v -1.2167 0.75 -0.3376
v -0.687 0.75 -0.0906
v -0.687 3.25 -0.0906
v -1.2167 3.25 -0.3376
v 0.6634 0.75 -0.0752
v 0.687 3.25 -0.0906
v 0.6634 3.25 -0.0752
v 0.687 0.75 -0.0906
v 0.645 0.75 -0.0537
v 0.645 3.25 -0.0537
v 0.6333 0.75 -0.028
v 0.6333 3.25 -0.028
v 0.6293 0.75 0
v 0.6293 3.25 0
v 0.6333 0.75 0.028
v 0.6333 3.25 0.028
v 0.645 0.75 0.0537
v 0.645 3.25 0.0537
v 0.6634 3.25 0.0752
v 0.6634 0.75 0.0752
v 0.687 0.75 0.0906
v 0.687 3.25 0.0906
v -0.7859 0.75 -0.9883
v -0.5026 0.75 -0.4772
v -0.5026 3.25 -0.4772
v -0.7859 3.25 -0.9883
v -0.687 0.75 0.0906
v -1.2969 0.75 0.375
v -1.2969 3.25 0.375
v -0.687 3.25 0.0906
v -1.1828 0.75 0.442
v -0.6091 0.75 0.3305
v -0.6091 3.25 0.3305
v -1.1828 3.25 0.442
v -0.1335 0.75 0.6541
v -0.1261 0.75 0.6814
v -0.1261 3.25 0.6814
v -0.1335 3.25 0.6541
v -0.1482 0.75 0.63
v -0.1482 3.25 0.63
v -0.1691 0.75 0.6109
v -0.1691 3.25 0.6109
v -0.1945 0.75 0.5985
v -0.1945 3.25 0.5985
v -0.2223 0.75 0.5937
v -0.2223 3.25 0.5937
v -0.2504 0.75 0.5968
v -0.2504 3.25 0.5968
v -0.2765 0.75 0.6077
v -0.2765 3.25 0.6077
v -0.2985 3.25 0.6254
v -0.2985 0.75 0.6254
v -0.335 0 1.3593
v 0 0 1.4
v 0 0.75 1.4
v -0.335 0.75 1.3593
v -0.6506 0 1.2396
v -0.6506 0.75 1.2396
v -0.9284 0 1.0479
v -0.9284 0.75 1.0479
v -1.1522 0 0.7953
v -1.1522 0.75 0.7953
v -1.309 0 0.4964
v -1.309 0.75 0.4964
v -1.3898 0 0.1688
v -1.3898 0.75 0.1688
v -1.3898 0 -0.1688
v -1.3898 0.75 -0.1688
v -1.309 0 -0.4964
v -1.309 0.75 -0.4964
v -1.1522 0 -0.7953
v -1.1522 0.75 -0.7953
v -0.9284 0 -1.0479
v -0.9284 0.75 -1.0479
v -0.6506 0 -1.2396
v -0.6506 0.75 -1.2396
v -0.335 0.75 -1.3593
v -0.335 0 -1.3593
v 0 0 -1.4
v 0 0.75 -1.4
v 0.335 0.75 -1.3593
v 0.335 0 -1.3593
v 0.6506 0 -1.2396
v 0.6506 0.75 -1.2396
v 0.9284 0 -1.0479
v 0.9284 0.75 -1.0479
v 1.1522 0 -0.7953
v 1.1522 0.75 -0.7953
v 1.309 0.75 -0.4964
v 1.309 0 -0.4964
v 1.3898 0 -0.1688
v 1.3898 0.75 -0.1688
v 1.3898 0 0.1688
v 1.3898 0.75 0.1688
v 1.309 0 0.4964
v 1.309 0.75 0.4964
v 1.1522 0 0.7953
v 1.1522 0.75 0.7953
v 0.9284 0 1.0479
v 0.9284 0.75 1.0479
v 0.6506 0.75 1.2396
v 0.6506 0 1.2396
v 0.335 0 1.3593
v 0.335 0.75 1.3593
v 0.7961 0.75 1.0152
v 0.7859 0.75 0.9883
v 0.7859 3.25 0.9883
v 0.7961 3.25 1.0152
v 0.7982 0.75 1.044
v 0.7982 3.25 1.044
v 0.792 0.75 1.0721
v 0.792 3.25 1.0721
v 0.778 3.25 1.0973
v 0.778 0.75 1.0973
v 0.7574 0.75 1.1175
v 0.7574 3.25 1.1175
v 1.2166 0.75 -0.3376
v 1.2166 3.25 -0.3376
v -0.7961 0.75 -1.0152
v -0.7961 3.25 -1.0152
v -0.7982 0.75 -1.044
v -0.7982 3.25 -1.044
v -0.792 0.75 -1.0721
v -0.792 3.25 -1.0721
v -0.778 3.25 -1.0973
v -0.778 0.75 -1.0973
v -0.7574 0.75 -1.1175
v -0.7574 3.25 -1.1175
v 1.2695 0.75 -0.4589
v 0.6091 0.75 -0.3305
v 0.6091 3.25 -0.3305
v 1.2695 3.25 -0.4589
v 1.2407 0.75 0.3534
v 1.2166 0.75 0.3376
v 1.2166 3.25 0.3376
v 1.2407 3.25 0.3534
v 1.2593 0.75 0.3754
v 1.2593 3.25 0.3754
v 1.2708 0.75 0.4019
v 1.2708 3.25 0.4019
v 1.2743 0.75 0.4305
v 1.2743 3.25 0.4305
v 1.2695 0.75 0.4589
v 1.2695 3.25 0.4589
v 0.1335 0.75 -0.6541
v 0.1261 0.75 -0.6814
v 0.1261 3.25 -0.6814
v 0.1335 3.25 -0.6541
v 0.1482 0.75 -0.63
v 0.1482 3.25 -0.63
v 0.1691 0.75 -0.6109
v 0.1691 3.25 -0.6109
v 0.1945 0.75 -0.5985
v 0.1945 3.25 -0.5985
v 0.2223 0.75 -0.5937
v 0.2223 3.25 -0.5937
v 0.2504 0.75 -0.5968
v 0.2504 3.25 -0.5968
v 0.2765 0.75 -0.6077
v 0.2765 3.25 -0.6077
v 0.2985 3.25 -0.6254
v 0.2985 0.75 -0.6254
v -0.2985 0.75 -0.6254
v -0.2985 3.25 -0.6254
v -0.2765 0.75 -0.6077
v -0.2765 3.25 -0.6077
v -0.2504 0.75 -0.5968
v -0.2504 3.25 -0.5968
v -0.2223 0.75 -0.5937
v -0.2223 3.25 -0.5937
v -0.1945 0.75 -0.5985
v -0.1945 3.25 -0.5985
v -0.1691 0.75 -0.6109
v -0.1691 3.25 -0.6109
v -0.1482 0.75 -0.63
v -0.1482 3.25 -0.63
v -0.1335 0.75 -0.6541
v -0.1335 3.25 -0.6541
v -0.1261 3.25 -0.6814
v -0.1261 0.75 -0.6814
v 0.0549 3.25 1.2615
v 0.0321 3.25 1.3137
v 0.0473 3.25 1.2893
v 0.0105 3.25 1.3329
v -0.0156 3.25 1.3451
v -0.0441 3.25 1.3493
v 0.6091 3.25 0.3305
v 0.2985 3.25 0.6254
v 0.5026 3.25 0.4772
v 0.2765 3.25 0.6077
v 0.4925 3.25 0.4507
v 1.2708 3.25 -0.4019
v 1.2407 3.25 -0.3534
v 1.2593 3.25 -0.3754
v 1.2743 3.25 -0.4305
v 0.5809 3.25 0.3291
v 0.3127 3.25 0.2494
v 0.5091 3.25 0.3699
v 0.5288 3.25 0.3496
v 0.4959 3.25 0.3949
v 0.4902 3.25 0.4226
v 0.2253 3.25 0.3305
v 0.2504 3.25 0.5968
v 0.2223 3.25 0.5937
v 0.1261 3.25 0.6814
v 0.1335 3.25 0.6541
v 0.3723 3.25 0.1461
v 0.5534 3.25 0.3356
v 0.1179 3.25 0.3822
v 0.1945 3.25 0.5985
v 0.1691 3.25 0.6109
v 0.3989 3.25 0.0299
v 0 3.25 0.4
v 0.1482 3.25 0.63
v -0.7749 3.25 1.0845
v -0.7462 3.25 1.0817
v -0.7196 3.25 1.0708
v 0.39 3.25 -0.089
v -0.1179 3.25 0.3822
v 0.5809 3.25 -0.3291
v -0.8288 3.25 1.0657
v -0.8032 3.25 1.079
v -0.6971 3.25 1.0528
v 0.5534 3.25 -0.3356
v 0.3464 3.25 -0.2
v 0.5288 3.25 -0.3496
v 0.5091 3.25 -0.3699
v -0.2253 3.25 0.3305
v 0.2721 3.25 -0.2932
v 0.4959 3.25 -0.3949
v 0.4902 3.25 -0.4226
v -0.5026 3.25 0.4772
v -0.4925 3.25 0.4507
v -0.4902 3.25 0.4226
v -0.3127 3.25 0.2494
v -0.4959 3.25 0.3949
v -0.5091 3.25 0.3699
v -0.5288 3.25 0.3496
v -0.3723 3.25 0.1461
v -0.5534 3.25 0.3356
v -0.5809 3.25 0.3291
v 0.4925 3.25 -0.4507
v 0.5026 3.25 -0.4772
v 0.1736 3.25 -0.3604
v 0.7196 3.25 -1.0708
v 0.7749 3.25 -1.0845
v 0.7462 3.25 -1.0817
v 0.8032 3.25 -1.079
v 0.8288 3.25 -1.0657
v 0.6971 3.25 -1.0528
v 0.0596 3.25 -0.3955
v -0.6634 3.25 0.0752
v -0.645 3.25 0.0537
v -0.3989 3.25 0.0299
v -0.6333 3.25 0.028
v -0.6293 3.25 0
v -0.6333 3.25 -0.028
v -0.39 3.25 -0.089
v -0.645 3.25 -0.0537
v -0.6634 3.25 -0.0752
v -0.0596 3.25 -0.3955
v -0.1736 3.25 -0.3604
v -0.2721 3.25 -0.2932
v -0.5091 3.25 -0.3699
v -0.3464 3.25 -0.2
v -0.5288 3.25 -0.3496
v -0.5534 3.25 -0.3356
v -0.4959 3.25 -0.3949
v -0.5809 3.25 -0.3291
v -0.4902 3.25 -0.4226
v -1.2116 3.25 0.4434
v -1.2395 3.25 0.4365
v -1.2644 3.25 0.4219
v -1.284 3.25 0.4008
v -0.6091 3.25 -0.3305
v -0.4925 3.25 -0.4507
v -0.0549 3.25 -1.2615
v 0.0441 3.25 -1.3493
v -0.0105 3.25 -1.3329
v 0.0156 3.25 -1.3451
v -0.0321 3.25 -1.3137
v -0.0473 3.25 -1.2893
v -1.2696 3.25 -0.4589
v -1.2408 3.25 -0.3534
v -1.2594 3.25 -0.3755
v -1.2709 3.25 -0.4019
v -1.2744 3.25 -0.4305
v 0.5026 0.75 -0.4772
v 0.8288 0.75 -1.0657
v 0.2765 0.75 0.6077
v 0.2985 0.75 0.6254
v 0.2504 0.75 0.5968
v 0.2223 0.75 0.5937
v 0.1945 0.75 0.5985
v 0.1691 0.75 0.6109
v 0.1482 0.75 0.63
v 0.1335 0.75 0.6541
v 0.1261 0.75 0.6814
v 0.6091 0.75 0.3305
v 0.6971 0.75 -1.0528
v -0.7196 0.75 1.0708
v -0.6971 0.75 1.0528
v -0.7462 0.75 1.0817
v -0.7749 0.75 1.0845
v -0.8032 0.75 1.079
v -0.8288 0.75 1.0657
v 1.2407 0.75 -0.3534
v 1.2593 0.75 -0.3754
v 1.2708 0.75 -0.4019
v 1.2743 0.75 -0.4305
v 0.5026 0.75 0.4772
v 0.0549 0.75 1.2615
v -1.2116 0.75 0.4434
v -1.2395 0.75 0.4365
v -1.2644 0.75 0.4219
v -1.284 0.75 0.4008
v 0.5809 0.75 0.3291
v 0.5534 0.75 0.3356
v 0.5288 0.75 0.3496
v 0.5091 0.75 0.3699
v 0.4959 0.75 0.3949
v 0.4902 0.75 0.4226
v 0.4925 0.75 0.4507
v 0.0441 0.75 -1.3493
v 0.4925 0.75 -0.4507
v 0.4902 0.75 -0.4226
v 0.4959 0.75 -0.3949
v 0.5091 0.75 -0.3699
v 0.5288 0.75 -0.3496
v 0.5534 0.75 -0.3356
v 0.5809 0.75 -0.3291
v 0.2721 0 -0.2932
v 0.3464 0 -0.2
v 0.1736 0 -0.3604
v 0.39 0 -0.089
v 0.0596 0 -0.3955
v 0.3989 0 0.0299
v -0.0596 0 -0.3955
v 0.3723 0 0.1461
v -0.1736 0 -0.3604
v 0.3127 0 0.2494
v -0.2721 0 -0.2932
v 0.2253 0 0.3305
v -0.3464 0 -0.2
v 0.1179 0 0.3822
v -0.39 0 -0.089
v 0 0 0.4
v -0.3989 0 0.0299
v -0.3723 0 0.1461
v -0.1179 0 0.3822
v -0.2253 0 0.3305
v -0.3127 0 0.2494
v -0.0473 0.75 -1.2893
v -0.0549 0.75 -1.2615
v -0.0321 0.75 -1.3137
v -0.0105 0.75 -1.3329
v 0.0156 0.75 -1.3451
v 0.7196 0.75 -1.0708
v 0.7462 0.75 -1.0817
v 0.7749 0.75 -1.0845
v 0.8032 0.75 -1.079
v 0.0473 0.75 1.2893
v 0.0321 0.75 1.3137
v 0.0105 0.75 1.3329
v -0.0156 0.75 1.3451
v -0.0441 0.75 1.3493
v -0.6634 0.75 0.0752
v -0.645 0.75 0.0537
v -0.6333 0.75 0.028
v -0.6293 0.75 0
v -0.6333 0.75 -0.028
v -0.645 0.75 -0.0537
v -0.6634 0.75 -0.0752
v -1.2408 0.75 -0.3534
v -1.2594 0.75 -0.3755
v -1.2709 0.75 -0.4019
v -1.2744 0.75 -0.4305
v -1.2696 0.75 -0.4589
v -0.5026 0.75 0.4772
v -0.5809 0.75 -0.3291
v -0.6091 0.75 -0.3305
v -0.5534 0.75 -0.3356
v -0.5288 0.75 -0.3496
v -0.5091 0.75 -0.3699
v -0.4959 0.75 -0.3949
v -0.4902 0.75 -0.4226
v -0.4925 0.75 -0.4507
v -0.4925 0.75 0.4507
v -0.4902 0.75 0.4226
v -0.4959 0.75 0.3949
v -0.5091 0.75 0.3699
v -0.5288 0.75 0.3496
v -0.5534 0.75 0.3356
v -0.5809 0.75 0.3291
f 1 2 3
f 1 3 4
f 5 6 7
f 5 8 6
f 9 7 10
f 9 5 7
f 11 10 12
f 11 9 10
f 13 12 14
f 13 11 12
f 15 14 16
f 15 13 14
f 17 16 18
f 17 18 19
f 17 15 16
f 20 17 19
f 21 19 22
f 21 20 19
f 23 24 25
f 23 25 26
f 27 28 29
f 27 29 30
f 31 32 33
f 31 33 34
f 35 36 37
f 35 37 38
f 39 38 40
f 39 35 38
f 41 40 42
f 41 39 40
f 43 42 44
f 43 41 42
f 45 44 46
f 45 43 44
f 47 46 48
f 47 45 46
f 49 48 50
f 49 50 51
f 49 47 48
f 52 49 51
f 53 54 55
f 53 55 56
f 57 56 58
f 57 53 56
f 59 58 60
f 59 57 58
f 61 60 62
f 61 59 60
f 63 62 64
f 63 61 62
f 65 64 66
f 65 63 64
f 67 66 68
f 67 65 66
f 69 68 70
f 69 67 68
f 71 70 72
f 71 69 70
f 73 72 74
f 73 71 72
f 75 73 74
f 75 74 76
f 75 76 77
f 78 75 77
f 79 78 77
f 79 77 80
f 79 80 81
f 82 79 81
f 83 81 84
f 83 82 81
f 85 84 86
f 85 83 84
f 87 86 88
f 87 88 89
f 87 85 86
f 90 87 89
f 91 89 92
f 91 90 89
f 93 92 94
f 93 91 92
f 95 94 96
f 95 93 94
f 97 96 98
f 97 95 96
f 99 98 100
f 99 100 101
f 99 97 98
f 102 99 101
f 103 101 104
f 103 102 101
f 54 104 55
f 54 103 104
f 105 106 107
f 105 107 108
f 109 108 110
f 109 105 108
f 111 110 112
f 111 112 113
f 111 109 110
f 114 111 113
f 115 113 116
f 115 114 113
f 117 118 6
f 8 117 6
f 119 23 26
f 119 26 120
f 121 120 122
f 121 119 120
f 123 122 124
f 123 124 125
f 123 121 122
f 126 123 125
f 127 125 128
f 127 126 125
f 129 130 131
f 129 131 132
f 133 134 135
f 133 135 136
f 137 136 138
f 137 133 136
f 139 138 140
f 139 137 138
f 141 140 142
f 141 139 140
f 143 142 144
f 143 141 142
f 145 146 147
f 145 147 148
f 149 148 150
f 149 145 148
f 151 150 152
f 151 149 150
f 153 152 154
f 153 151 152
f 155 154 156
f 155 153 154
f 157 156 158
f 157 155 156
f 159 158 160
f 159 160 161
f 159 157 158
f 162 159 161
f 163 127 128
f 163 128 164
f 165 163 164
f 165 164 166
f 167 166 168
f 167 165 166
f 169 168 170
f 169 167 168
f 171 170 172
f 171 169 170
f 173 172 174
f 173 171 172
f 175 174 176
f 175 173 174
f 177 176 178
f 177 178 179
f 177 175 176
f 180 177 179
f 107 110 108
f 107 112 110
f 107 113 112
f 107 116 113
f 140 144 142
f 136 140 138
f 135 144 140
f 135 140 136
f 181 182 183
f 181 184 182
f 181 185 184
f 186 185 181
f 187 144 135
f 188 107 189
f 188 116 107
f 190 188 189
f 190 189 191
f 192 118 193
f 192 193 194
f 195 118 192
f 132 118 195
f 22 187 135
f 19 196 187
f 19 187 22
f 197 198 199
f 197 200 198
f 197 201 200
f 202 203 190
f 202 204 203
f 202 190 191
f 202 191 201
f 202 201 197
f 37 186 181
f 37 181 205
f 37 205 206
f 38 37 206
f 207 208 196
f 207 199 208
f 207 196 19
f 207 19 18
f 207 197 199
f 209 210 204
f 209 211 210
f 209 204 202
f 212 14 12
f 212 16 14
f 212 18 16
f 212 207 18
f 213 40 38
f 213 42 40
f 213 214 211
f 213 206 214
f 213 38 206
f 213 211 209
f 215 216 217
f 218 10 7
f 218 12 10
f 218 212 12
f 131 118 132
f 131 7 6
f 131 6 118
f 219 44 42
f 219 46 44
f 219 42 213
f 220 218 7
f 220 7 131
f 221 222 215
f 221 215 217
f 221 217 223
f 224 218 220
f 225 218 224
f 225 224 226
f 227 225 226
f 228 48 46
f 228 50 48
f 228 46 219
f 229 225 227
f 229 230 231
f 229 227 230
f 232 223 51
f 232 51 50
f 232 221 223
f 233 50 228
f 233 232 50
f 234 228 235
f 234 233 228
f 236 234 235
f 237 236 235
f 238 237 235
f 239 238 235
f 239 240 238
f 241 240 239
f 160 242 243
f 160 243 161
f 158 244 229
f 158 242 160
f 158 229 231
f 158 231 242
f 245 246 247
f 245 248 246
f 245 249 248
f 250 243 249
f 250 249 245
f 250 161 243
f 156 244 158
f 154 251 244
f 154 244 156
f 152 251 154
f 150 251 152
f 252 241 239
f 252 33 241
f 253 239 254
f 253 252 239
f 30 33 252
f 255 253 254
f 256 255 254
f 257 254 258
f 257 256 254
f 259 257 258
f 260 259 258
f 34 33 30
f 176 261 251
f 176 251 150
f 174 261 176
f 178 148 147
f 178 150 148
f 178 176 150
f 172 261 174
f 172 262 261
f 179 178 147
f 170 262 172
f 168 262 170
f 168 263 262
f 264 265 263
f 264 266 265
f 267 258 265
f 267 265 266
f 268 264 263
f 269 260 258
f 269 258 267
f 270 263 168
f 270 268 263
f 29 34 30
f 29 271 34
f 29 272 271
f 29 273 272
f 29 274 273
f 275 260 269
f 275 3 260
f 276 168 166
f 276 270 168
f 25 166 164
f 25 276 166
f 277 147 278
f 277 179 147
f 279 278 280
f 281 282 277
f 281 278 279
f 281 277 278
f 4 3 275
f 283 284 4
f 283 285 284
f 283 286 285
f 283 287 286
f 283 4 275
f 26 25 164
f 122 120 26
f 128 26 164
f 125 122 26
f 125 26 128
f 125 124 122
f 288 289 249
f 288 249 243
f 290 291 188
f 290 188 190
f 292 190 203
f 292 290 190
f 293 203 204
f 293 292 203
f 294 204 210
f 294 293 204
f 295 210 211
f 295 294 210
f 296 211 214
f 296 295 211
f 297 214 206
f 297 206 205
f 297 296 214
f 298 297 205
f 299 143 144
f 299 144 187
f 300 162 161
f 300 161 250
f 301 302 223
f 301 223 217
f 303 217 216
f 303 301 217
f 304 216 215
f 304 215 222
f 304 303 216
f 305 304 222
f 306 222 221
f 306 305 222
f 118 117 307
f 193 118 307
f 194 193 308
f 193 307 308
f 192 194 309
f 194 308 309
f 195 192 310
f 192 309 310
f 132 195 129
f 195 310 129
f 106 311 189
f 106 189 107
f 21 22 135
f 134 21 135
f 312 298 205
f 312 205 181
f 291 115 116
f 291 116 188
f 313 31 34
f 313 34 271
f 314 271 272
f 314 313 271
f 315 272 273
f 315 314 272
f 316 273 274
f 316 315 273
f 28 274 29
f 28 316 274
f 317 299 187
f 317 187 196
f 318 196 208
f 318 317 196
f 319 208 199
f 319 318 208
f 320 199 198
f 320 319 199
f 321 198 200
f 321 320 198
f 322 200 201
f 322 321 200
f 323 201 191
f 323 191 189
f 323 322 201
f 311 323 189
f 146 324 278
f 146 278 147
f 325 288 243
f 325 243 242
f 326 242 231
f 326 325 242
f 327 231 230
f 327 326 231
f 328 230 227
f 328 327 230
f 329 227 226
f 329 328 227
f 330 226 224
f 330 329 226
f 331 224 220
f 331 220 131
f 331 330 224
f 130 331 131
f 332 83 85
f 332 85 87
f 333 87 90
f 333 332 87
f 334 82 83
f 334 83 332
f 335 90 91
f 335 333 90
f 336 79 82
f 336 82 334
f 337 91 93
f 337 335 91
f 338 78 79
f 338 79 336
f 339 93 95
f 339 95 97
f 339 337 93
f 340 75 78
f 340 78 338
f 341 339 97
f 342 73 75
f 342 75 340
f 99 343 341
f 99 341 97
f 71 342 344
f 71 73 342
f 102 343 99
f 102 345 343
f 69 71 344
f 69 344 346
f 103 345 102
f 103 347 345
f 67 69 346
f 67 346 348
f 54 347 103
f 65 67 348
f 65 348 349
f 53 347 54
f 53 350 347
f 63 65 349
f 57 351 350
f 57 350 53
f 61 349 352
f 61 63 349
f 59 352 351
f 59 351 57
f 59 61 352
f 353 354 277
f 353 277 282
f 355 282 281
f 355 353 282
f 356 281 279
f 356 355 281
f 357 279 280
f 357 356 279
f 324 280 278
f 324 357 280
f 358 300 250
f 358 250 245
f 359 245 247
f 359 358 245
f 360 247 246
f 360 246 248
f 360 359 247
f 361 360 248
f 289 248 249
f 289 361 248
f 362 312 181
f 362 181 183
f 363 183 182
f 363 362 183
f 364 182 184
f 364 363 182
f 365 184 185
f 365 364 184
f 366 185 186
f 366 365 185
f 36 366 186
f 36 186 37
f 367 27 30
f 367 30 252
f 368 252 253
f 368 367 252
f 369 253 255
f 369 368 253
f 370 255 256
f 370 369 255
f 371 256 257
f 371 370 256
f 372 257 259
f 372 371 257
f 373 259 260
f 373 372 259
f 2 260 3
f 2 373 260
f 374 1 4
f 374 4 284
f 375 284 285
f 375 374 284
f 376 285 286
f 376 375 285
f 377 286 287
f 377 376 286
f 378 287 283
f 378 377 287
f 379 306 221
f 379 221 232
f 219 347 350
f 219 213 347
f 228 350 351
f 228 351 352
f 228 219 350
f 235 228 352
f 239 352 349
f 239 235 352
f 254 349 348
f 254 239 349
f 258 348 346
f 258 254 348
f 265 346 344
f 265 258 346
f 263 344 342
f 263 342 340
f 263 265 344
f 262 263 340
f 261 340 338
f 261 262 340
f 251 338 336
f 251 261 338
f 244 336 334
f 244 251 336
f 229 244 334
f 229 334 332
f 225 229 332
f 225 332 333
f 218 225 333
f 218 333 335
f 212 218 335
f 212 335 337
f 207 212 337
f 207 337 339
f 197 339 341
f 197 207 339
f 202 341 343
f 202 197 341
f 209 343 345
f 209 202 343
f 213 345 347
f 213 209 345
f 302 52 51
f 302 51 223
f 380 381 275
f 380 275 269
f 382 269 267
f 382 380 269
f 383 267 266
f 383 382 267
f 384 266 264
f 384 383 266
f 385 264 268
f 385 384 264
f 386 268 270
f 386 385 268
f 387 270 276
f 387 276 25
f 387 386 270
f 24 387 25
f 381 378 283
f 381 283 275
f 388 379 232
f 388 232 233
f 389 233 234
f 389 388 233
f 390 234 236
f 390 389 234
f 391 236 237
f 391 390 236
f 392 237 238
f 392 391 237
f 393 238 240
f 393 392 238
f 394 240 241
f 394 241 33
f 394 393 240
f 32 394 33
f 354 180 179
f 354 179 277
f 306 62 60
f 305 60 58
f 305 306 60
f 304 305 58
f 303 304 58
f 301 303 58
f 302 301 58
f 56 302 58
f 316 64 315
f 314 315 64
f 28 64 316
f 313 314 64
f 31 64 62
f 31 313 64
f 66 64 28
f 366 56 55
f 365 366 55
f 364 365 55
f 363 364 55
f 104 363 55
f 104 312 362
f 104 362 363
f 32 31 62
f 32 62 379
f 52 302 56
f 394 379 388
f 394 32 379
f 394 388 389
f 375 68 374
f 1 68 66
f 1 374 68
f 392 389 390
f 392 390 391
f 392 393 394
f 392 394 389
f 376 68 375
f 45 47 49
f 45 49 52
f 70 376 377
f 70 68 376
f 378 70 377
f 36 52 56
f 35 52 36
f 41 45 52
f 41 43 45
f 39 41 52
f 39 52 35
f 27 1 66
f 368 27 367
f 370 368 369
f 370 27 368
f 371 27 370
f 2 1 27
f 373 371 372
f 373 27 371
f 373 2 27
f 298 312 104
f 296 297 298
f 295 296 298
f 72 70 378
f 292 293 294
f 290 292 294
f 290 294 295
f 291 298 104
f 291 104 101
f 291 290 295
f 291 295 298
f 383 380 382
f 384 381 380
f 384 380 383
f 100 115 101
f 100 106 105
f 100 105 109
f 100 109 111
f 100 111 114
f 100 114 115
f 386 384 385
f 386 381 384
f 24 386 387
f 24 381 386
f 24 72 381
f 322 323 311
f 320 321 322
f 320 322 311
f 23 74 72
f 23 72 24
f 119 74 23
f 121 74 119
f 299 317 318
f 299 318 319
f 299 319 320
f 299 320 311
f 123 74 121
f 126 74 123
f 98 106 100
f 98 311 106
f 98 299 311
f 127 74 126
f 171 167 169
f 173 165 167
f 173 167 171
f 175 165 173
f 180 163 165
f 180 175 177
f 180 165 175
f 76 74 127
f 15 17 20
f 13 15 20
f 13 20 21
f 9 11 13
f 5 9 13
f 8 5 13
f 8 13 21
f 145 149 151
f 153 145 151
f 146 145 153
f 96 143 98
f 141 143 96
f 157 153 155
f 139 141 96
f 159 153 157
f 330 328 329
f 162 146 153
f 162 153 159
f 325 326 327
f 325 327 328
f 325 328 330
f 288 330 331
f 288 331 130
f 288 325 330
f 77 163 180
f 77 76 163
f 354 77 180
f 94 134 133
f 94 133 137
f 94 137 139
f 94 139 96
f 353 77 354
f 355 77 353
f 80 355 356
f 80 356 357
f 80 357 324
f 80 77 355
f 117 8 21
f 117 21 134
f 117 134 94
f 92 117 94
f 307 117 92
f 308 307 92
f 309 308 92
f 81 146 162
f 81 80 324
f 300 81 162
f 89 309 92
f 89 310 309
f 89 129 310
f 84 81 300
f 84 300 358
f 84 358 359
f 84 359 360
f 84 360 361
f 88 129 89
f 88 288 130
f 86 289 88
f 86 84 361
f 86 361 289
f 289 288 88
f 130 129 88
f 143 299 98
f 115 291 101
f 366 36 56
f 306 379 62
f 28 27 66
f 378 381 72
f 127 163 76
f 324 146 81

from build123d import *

# Parameters (mm, degrees)
CUT_EXTRUDE1_DEPTH = 2.5
FILLET1_R          = 0.1
CIRPATTERN1_START  = 0.75
CIRPATTERN1_DEPTH  = 2.5


# Read off the part's stored shape, not the designer's step: CirPattern1
with BuildPart() as part:
    # Sketch1 → Revolve1 (revolve)
    with BuildSketch(Plane.XY, mode=Mode.PRIVATE) as revolve1_sk:
        Polygon((0.4, 0), (0.4, 3.25), (1.35, 3.25), (1.35, 0.75), (1.4, 0.75), (1.4, 0), align=None)
    revolve(revolve1_sk.sketch.rotate(Axis((0, 55, 0), (0, -1, 0)), 90), axis=Axis((0, 55, 0), (0, -1, 0)))

    # Sketch2 → Cut-Extrude1 (cut)
    with BuildSketch(Plane(origin=(0, 3.25, 0), x_dir=(1, 0, 0), z_dir=(0, 1, 0))):
        Polygon((1.296871235, 0.375), (0.49268114, 0), (1.296871235, -0.375), (1.471211197, -0.375), (1.471211197, 0.375), align=None)
    extrude(amount=-CUT_EXTRUDE1_DEPTH, mode=Mode.SUBTRACT)

    # Fillet1
    fillet1_edges = [part.edges().sort_by_distance(p)[0] for p in [
        (0.49268114, 2, 0),
        (1.296871235, 2, 0.375),
        (1.296871235, 2, -0.375),
    ]]
    fillet(fillet1_edges, radius=FILLET1_R)

    # CirPattern1 outline → CirPattern1 (cut)
    with BuildSketch(Plane(origin=(0, 0, 0), x_dir=(1, 0, 0), z_dir=(0, 1, 0)).offset(CIRPATTERN1_START)):
        with BuildLine():
            ThreePointArc((1.268314657, -0.462469385), (1.268946471, -0.460684309), (1.269544372, -0.45888759))
            Line((1.269544372, -0.45888759), (0.609098044, -0.330509829))
            ThreePointArc((0.609098044, -0.330509829), (0.509115445, -0.369894022), (0.502555173, -0.47715351))
            Line((0.502555173, -0.47715351), (0.785879225, -0.988283629))
            ThreePointArc((0.785879225, -0.988283629), (0.796074313, -1.058284325), (0.757401445, -1.117516466))
            ThreePointArc((0.757401445, -1.117516466), (1.064496642, -0.830269173), (1.268314657, -0.462469385))
        make_face()
        with BuildLine():
            ThreePointArc((1.268314657, 0.462469385), (1.091055986, 0.795045179), (0.828771399, 1.065663159))
            Line((0.828771399, 1.065663159), (0.502555173, 0.47715351))
            ThreePointArc((0.502555173, 0.47715351), (0.509115445, 0.369894022), (0.609098044, 0.330509829))
            Line((0.609098044, 0.330509829), (1.269544372, 0.45888759))
            ThreePointArc((1.269544372, 0.45888759), (1.268946471, 0.460684309), (1.268314657, 0.462469385))
        make_face()
        with BuildLine():
            ThreePointArc((0.828771399, 1.065663159), (0.458900413, 1.269610338), (0.044109058, 1.349279212))
            Line((0.044109058, 1.349279212), (0.12611188, 0.681419818))
            ThreePointArc((0.12611188, 0.681419818), (0.194464795, 0.5985011), (0.298501865, 0.625406916))
            Line((0.298501865, 0.625406916), (0.697063549, 1.052811995))
            ThreePointArc((0.697063549, 1.052811995), (0.760487712, 1.084139504), (0.828771399, 1.065663159))
        make_face()
        with BuildLine():
            ThreePointArc((0.044109058, 1.349279212), (-0.375, 1.296871235), (-0.757401445, 1.117516466))
            Line((-0.757401445, 1.117516466), (-0.298501865, 0.625406916))
            ThreePointArc((-0.298501865, 0.625406916), (-0.194464795, 0.5985011), (-0.12611188, 0.681419818))
            Line((-0.12611188, 0.681419818), (-0.054891106, 1.26146647))
            ThreePointArc((-0.054891106, 1.26146647), (-0.021993729, 1.324090745), (0.044109058, 1.349279212))
        make_face()
        with BuildLine():
            ThreePointArc((-0.757401445, 1.117516466), (-1.065663159, 0.828771399), (-1.269610338, 0.458900413))
            Line((-1.269610338, 0.458900413), (-0.609098044, 0.330509829))
            ThreePointArc((-0.609098044, 0.330509829), (-0.509115445, 0.369894022), (-0.502555173, 0.47715351))
            Line((-0.502555173, 0.47715351), (-0.785879225, 0.988283629))
            ThreePointArc((-0.785879225, 0.988283629), (-0.796074313, 1.058284325), (-0.757401445, 1.117516466))
        make_face()
        with BuildLine():
            ThreePointArc((-1.269610338, 0.458900413), (-1.349279212, 0.044109057), (-1.296871235, -0.375))
            Line((-1.296871235, -0.375), (-0.687039472, -0.090630779))
            ThreePointArc((-0.687039472, -0.090630779), (-0.629301298, 0), (-0.687039472, 0.090630779))
            Line((-0.687039472, 0.090630779), (-1.216688191, 0.337610032))
            ThreePointArc((-1.216688191, 0.337610032), (-1.266081567, 0.388249263), (-1.269610338, 0.458900413))
        make_face()
        with BuildLine():
            ThreePointArc((-1.296871235, -0.375), (-1.117516466, -0.757401445), (-0.828771399, -1.065663159))
            Line((-0.828771399, -1.065663159), (-0.502555173, -0.47715351))
            ThreePointArc((-0.502555173, -0.47715351), (-0.509115445, -0.369894022), (-0.609098044, -0.330509829))
            Line((-0.609098044, -0.330509829), (-1.182763621, -0.442019121))
            ThreePointArc((-1.182763621, -0.442019121), (-1.252488695, -0.430083821), (-1.296871235, -0.375))
        make_face()
        with BuildLine():
            ThreePointArc((-0.828771399, -1.065663159), (-0.458900413, -1.269610338), (-0.044109058, -1.349279212))
            Line((-0.044109058, -1.349279212), (-0.12611188, -0.681419818))
            ThreePointArc((-0.12611188, -0.681419818), (-0.194464795, -0.5985011), (-0.298501865, -0.625406916))
            Line((-0.298501865, -0.625406916), (-0.697063549, -1.052811995))
            ThreePointArc((-0.697063549, -1.052811995), (-0.760487712, -1.084139504), (-0.828771399, -1.065663159))
        make_face()
        with BuildLine():
            ThreePointArc((-0.044109058, -1.349279212), (0.375, -1.296871235), (0.757401445, -1.117516466))
            Line((0.757401445, -1.117516466), (0.298501865, -0.625406916))
            ThreePointArc((0.298501865, -0.625406916), (0.194464795, -0.5985011), (0.12611188, -0.681419818))
            Line((0.12611188, -0.681419818), (0.054891106, -1.26146647))
            ThreePointArc((0.054891106, -1.26146647), (0.021993729, -1.324090745), (-0.044109058, -1.349279212))
        make_face()
    extrude(amount=CIRPATTERN1_DEPTH, mode=Mode.SUBTRACT)


solid = part.part
